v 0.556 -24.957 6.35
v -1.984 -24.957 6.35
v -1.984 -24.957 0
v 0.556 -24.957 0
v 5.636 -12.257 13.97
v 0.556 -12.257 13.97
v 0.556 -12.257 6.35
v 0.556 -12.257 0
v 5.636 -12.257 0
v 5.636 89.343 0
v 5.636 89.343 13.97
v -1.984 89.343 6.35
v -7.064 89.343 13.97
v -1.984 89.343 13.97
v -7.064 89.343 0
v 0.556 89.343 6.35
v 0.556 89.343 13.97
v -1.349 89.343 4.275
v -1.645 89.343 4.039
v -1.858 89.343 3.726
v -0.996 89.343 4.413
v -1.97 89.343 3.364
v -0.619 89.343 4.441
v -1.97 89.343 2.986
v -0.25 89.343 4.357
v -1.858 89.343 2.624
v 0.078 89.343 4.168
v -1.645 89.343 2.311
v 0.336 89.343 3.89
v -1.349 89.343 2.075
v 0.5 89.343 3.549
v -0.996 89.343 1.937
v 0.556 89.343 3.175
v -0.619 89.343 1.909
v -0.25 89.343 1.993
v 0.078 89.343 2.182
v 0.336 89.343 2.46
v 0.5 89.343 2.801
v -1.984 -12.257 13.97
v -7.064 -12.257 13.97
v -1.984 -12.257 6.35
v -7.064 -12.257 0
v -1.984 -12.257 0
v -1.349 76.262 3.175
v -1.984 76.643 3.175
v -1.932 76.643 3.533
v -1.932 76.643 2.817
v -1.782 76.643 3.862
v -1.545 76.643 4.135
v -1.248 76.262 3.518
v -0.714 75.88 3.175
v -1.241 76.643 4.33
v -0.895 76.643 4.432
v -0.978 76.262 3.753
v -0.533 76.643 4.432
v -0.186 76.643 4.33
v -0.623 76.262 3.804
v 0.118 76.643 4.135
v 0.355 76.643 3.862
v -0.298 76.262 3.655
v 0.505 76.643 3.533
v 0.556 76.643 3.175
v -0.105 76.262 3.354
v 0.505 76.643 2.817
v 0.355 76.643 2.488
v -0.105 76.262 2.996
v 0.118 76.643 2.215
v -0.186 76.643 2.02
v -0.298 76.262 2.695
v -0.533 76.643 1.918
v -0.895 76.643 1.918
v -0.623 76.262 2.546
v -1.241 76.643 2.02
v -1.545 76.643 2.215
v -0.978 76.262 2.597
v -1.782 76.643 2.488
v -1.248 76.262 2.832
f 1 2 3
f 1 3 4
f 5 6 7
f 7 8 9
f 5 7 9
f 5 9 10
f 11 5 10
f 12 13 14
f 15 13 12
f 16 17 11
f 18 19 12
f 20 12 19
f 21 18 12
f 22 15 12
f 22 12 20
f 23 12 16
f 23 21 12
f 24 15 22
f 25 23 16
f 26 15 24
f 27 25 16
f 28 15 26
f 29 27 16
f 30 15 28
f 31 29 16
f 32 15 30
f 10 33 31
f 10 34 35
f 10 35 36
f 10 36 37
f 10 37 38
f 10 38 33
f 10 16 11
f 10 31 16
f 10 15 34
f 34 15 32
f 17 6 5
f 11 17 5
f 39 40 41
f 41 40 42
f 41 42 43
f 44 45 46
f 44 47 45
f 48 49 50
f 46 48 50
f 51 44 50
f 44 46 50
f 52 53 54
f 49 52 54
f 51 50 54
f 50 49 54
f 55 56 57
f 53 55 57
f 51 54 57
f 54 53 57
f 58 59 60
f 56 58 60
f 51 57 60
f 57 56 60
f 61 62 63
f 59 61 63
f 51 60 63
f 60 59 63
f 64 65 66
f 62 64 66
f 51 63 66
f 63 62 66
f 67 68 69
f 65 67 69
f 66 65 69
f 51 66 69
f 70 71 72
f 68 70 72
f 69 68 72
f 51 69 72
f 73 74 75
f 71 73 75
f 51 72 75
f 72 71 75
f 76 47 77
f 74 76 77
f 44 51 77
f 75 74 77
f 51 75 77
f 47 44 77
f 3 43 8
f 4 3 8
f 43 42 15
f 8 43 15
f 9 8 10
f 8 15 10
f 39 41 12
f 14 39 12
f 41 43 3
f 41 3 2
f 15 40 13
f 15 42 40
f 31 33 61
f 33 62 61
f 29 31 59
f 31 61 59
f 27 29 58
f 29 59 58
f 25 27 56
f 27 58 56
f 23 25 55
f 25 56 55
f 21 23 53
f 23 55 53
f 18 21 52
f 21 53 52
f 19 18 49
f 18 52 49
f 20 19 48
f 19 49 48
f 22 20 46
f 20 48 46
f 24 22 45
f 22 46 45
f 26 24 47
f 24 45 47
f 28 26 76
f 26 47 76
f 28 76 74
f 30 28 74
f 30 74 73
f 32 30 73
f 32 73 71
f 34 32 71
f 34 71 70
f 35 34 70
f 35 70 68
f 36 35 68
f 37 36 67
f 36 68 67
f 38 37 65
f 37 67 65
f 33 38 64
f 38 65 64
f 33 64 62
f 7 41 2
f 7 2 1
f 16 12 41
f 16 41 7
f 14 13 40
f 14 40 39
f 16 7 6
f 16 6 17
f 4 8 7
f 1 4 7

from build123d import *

# Parameters (mm, degrees)
F0_W     = 12.7
F0_H     = 101.6
F1_DEPTH = 6.35
F2_W     = 5.08
F2_H     = 101.6
F3_DEPTH = 7.62
F4_W     = 2.54
F4_H     = 6.35
F5_DEPTH = 12.7
F7_D     = 2.54
F7_DEPTH = 12.7
F7_TIP   = 0.7630929862


with BuildPart() as f1:
    # F0 (on Top) → F1 (new body)
    with BuildSketch(Plane.XY):
        with Locations((-0.7137963548, 38.543052576)):
            Rectangle(F0_W, F0_H)
    extrude(amount=F1_DEPTH)

    # F2 (on face) → F3 (join)
    with BuildSketch(Plane.XY.offset(6.35)):
        with Locations((-4.5237963548, 38.543052576)):
            Rectangle(F2_W, F2_H)
        with Locations((3.0962036452, 38.543052576)):
            Rectangle(F2_W, F2_H)
    extrude(amount=F3_DEPTH)

    # F4 (on face) → F5 (join)
    with BuildSketch(Plane.XZ.offset(12.256947424)):
        with Locations((-0.7137963548, 3.175)):
            Rectangle(F4_W, F4_H)
    extrude(amount=F5_DEPTH)

    # F7
    with Locations(Plane(origin=(0, 89.343052576, 0), x_dir=(-1, 0, 0), z_dir=(0, 1, 0))):
        with Locations((0.7137963548, 3.175)):
            Hole(F7_D / 2, depth=F7_DEPTH)
            with Locations((0, 0, -(F7_DEPTH + F7_TIP / 2))):  # 118° drill point
                Cone(0, F7_D / 2, F7_TIP, mode=Mode.SUBTRACT)


solid = f1.part
